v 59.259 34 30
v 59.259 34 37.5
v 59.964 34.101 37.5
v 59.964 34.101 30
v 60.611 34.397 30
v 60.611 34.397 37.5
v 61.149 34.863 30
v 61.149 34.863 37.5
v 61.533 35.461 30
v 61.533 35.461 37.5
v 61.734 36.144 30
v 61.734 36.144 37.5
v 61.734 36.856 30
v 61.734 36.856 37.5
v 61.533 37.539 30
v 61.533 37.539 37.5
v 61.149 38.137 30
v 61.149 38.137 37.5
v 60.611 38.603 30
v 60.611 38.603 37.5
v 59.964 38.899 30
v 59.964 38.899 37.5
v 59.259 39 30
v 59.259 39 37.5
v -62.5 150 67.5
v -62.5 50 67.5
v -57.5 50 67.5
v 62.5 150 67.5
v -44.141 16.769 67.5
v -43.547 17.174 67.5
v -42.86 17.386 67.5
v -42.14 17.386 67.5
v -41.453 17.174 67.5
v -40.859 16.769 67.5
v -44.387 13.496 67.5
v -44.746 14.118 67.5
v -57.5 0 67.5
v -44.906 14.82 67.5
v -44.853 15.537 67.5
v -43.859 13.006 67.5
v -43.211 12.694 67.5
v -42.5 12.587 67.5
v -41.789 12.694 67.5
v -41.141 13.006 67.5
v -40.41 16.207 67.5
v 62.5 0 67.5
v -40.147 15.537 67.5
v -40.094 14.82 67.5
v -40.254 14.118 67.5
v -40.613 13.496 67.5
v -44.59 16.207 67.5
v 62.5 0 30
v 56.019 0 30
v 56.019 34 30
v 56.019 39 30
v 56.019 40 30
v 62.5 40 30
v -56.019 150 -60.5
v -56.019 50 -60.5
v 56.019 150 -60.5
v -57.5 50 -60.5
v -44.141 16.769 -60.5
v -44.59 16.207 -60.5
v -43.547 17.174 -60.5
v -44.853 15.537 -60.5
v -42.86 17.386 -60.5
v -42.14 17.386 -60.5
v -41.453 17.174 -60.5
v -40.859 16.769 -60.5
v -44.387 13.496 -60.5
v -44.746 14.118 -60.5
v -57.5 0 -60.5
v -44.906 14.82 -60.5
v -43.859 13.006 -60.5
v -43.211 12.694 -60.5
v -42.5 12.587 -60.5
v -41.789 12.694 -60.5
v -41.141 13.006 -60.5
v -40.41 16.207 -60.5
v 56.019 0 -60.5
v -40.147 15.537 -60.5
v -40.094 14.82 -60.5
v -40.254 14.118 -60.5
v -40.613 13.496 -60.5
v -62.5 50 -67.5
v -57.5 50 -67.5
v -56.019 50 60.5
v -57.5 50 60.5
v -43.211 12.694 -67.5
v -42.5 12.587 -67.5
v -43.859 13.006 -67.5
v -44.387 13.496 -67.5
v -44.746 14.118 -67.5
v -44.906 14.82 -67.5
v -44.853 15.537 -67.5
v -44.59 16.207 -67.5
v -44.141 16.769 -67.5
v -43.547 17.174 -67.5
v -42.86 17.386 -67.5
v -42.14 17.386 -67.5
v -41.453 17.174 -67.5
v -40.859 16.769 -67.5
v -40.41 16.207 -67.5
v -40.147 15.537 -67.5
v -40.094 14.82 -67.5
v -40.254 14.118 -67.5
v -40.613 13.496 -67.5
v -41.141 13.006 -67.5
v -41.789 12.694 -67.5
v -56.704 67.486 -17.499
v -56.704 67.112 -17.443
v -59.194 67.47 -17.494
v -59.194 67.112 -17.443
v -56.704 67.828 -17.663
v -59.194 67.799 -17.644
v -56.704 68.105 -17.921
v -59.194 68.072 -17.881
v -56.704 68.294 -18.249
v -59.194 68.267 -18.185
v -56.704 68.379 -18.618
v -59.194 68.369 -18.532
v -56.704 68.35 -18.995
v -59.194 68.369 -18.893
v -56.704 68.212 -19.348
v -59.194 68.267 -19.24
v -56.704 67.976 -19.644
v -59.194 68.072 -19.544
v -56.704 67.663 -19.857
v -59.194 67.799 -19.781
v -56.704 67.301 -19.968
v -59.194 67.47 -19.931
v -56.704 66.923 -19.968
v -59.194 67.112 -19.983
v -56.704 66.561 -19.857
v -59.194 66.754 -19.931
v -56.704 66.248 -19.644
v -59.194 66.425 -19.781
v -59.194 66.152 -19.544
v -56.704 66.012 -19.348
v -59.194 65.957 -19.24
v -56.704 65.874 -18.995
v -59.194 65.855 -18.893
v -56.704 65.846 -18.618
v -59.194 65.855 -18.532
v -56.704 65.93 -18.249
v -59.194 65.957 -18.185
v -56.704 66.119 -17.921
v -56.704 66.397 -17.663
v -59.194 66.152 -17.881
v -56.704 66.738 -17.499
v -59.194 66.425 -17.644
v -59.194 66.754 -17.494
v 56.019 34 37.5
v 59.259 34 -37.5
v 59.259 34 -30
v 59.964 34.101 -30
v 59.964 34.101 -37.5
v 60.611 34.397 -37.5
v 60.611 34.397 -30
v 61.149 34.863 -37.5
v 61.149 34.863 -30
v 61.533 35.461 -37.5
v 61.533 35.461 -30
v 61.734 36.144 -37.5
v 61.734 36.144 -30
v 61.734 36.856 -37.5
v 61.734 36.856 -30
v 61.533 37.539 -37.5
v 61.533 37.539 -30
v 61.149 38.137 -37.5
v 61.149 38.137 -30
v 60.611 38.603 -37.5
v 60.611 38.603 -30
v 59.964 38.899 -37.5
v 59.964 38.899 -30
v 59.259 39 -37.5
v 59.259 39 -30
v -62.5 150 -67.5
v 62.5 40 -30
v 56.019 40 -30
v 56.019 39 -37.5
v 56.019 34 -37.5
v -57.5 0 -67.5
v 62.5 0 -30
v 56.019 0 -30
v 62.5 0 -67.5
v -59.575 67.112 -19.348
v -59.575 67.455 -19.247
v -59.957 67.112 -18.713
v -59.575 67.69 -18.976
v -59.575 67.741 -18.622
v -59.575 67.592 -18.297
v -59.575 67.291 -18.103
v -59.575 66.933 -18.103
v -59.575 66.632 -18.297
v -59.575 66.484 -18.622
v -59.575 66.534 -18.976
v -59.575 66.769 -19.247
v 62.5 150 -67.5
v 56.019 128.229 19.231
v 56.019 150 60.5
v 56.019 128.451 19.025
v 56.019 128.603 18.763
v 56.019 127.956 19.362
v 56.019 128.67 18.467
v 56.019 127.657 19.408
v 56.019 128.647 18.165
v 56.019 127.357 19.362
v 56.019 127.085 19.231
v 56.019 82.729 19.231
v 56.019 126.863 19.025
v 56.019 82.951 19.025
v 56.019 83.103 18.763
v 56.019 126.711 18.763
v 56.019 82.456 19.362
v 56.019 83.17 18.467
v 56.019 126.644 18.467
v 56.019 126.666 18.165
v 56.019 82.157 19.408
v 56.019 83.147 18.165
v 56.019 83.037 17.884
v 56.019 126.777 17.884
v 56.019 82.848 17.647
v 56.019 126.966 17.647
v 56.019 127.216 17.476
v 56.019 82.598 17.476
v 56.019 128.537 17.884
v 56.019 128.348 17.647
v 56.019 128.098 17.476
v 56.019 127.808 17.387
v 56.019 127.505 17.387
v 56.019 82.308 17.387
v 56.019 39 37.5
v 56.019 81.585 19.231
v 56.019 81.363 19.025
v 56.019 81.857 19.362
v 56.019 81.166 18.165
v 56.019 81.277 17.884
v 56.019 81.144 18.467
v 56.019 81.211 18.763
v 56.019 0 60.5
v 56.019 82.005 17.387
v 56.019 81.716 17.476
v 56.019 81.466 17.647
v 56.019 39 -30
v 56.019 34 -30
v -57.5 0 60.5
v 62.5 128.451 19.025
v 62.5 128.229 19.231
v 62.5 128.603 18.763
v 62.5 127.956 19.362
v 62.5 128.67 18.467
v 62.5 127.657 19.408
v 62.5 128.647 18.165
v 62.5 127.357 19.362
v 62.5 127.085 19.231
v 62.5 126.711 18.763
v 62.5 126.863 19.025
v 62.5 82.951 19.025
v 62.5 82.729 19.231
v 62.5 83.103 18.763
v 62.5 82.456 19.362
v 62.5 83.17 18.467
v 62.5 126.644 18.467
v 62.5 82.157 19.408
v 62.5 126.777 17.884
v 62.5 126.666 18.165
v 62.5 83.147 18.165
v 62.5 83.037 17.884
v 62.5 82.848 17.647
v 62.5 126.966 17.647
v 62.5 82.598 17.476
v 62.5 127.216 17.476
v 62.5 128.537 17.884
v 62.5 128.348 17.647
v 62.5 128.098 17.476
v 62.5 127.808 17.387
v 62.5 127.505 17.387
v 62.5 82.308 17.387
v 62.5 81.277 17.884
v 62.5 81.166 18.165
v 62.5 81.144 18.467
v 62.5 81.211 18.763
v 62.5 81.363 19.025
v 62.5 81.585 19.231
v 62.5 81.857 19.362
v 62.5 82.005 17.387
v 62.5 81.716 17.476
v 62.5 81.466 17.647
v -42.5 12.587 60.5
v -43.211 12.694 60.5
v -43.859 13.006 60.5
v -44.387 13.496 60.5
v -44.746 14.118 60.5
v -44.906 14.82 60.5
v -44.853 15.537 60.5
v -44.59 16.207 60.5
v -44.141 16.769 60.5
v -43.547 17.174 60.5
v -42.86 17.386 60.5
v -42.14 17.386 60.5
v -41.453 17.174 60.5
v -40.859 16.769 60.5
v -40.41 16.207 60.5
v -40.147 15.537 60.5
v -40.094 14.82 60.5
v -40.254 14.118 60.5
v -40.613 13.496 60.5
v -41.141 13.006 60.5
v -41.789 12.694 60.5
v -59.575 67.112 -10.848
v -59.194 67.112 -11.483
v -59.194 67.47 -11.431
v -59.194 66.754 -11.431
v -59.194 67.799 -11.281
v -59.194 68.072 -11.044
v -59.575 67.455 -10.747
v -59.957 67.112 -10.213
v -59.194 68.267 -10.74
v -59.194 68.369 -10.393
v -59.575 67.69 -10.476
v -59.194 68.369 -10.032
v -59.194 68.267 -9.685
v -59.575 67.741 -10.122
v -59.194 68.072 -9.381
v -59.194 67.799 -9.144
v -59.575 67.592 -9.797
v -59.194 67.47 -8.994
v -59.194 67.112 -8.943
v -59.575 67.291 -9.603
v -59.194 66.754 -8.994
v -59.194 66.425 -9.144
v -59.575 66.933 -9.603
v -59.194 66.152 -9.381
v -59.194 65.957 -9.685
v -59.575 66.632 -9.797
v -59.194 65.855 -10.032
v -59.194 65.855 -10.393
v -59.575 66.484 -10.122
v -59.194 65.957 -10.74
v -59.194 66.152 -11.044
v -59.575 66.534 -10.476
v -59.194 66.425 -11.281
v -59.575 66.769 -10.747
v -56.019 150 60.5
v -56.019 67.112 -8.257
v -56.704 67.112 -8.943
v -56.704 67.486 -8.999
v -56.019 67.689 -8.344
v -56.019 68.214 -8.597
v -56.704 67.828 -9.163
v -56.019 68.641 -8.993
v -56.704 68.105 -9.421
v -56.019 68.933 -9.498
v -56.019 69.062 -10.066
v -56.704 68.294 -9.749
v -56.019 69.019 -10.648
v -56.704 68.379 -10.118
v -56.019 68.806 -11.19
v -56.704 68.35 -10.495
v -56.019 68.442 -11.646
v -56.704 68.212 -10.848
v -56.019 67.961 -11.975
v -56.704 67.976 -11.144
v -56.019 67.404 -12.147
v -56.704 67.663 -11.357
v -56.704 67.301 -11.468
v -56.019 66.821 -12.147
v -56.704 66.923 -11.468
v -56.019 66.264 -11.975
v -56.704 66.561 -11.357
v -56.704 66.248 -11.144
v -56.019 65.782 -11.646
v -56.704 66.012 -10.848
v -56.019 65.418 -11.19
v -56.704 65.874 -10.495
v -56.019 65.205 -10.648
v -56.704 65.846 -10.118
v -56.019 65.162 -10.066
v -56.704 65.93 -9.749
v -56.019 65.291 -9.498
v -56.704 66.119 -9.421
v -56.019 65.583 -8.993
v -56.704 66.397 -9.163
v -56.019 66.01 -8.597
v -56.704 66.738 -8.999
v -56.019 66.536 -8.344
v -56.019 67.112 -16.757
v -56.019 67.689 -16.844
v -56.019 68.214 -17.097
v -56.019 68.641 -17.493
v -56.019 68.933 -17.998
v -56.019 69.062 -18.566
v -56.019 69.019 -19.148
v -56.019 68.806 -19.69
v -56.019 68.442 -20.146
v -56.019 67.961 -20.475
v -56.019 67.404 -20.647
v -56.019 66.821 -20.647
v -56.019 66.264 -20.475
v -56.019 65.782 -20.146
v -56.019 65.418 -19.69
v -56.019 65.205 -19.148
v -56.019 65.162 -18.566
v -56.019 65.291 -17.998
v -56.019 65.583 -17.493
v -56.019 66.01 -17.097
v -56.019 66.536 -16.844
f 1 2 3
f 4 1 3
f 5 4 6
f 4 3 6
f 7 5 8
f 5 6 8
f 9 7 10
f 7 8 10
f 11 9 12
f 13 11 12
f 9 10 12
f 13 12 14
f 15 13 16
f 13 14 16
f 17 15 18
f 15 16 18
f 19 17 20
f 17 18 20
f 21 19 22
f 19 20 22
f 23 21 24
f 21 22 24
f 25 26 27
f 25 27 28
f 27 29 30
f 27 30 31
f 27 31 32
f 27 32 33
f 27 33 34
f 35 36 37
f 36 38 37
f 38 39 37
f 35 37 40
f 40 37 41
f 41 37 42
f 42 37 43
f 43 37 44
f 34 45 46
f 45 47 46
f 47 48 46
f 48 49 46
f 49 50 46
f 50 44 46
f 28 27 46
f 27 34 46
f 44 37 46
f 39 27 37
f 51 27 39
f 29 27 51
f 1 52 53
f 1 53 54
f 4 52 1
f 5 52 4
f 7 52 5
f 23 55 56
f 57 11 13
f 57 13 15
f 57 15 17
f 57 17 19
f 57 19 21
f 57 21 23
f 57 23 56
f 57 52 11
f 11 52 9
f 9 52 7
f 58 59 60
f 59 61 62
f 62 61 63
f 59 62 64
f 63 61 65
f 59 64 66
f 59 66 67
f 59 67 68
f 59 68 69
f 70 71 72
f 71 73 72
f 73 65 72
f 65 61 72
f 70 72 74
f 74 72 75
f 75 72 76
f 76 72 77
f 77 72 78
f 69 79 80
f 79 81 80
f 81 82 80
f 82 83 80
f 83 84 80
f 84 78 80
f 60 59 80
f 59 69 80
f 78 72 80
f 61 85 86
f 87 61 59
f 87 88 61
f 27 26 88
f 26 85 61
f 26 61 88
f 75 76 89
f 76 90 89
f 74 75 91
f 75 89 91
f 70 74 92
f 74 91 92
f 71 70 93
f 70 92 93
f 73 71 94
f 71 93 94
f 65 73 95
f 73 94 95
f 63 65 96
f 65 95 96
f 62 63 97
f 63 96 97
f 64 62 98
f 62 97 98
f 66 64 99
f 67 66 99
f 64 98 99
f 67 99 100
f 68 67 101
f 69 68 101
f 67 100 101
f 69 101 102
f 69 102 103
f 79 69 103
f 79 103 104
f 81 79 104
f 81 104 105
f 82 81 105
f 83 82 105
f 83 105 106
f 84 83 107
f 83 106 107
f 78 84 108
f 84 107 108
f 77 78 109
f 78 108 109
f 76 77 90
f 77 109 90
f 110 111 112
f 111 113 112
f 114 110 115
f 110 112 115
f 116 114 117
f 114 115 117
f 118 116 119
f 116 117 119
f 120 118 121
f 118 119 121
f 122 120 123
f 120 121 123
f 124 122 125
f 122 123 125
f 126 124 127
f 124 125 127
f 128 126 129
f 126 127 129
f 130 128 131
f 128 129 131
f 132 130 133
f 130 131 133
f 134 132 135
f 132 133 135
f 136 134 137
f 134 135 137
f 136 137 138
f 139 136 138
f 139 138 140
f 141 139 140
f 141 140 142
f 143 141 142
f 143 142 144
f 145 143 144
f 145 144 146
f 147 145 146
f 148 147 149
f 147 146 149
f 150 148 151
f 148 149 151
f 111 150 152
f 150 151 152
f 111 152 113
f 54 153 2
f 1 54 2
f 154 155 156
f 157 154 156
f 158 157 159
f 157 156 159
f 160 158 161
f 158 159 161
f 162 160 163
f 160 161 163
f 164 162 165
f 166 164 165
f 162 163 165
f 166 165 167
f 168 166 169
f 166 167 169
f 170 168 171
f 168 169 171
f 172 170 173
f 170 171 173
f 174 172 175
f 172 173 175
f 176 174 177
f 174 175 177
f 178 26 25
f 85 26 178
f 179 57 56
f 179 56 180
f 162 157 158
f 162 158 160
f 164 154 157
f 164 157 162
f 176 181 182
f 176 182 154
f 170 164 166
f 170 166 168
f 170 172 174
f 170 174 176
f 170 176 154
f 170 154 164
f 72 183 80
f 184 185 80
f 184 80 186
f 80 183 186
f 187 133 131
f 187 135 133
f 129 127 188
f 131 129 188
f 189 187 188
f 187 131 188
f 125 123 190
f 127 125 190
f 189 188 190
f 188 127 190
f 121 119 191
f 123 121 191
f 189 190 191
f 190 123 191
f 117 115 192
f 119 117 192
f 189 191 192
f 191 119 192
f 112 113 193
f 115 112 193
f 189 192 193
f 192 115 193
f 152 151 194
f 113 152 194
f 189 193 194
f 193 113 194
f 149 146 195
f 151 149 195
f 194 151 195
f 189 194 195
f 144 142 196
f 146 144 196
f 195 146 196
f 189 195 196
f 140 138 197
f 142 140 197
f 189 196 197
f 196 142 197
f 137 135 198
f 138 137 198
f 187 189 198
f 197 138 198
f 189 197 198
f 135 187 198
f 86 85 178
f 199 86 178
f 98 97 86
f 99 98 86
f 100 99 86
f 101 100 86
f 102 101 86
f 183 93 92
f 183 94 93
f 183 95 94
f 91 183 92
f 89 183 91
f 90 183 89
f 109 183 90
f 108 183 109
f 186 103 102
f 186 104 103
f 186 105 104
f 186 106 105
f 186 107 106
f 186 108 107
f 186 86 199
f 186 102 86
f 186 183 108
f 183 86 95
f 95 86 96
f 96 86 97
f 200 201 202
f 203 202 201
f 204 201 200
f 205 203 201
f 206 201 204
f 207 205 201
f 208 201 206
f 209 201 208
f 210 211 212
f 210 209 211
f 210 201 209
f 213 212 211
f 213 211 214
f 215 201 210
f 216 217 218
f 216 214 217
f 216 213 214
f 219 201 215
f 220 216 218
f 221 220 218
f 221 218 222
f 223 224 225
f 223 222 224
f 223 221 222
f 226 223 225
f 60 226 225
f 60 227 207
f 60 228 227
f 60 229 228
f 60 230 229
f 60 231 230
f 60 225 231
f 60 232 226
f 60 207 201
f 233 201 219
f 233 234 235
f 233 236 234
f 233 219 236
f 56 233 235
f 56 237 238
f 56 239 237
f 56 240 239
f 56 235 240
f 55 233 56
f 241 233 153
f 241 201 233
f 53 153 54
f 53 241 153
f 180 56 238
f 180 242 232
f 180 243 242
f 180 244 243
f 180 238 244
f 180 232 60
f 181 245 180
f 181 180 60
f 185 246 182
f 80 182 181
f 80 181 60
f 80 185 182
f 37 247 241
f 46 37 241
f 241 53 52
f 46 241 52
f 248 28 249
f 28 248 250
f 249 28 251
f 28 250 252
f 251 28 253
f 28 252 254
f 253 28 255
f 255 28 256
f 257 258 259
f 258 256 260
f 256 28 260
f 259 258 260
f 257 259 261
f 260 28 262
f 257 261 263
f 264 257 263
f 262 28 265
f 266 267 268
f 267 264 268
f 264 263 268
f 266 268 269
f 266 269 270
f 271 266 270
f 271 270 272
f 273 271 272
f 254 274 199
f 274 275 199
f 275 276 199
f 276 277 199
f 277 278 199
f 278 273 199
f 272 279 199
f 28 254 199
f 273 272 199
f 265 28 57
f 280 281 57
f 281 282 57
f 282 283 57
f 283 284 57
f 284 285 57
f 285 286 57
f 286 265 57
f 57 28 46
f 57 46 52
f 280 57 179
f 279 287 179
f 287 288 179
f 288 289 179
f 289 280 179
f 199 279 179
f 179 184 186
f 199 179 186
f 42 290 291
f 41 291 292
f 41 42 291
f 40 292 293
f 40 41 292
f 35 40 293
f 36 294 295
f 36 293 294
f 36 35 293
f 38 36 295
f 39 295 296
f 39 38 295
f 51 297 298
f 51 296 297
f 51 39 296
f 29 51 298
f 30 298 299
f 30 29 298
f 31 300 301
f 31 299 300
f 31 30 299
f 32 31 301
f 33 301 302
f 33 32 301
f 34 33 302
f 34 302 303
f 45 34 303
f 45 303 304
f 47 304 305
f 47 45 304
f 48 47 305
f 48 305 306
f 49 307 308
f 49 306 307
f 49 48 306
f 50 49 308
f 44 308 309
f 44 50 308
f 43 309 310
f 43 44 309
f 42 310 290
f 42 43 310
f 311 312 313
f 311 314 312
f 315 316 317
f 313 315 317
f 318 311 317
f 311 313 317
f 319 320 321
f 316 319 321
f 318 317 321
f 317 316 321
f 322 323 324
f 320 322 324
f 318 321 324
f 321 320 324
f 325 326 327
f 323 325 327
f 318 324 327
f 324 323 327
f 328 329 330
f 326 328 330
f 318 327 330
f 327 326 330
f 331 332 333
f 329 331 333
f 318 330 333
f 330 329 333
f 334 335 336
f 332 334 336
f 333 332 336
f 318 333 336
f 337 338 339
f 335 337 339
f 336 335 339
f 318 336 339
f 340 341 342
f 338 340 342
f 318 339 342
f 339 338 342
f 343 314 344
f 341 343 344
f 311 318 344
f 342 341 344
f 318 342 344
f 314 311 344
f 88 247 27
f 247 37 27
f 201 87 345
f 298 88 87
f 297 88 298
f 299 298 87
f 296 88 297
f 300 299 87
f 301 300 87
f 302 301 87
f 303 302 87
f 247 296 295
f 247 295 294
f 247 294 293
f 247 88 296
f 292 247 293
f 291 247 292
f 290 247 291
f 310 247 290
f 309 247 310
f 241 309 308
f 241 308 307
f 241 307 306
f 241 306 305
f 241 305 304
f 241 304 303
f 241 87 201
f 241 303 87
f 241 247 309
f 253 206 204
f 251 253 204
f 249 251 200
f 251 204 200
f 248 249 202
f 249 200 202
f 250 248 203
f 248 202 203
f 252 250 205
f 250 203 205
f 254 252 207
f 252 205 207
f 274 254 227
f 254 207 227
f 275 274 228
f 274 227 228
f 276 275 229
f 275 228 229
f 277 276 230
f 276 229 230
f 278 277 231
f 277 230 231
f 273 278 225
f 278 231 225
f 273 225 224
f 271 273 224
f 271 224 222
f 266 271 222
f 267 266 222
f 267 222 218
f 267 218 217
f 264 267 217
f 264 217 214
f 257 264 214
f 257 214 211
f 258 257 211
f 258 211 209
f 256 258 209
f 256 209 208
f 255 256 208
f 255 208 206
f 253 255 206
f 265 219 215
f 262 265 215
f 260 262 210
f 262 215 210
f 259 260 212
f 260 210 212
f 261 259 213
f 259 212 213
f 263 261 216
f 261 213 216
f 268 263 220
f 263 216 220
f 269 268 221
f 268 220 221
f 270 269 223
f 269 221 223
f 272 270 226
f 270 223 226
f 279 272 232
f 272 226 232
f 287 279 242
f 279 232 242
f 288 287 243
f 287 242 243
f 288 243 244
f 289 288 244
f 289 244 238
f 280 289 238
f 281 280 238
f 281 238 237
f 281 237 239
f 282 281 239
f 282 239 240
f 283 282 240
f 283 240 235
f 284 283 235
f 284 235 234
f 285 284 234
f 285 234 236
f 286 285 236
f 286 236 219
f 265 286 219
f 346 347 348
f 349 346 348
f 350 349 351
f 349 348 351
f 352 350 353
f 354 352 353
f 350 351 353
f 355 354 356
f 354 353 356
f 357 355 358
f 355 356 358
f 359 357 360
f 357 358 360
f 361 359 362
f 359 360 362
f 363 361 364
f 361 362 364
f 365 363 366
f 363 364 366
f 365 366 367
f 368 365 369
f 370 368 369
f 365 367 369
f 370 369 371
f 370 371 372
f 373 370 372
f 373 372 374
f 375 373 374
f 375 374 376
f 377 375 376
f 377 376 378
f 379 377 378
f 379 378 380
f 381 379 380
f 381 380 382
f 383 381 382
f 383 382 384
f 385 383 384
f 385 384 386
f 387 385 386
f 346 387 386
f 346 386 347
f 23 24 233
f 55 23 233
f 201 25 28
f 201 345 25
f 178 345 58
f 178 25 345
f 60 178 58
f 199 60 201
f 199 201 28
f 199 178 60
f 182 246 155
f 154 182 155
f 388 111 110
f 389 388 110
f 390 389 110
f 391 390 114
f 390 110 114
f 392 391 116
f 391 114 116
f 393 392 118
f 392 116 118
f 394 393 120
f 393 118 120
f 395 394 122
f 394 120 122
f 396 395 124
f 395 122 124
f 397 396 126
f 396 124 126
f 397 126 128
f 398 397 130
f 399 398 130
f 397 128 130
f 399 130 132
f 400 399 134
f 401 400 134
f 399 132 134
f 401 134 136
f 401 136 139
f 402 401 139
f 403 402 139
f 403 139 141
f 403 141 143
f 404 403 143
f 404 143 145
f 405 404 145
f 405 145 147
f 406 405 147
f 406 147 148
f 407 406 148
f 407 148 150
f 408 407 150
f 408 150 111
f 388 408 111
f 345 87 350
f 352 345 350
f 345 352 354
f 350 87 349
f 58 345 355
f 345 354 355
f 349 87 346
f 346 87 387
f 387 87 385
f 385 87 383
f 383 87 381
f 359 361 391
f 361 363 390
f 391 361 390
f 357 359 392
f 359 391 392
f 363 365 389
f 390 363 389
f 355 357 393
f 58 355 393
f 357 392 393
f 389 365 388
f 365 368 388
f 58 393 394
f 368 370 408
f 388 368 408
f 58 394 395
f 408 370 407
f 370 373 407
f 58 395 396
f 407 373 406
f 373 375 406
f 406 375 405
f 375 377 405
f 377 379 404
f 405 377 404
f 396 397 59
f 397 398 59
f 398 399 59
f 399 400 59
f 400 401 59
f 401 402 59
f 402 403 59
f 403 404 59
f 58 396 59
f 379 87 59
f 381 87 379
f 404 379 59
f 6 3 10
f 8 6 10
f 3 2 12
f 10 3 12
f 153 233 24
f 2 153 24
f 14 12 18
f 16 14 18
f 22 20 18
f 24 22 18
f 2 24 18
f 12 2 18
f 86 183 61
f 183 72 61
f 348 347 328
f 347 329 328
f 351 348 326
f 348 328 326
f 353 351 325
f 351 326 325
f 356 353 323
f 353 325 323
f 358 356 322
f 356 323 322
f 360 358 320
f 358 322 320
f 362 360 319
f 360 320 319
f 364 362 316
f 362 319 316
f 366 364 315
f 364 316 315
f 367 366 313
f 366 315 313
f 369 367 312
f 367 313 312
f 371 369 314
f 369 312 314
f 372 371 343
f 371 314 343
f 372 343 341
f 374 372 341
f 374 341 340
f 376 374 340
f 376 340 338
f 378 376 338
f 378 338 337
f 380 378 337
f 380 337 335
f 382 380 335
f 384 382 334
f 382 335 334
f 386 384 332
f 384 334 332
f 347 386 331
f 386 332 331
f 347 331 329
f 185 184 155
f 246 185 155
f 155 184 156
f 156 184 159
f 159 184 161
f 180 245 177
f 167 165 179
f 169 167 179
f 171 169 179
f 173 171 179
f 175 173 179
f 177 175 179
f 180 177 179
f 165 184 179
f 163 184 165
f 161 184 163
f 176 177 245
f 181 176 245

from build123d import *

# Parameters (mm, degrees)
SKETCH1_W                       = 125
SKETCH1_H                       = 135
SKETCH1_W_2                     = 112.037037038
SKETCH1_H_2                     = 121
BOSS_EXTRUDE1_DEPTH             = 150
SKETCH3_W                       = 5
SKETCH3_H                       = 50
CUT_EXTRUDE1_DEPTH              = 68.5
CUT_EXTRUDE1_DEPTH_BACK         = 68.5
CUT_EXTRUDE2_REACH              = 127
SKETCH4_W                       = 60
SKETCH4_H                       = 40
CUT_EXTRUDE3_DEPTH              = 37.5
F_2_CLEARANCE_HOLE1_D           = 2.032
F_2_CLEARANCE_HOLE1_DEPTH       = 6.481481481
F_3_CLEARANCE_HOLE1_D           = 2.54
F_3_CLEARANCE_HOLE1_DEPTH       = 3.175
F_3_CLEARANCE_HOLE1_CSINK_D     = 3.9116
F_3_CLEARANCE_HOLE1_CSINK_ANGLE = 90
F_3_CLEARANCE_HOLE1_TIP         = 0.763092986
CUT_EXTRUDE4_REACH              = 122
SKETCH19_W                      = 121
SKETCH19_H                      = 50


with BuildPart() as part:
    # Sketch1 → Boss-Extrude1 (new body)
    with BuildSketch(Plane(origin=(0, 0, 0), x_dir=(1, 0, 0), z_dir=(0, 1, 0))):
        Rectangle(SKETCH1_W, SKETCH1_H)
        Rectangle(SKETCH1_W_2, SKETCH1_H_2, mode=Mode.SUBTRACT)
    extrude(amount=BOSS_EXTRUDE1_DEPTH)

    # Sketch3 → Cut-Extrude1 (cut, two sides)
    with BuildSketch(Plane.XY) as cut_extrude1_sk:
        with Locations((-60, 25)):
            Rectangle(SKETCH3_W, SKETCH3_H)
    extrude(amount=CUT_EXTRUDE1_DEPTH, mode=Mode.SUBTRACT)
    extrude(cut_extrude1_sk.sketch, amount=-CUT_EXTRUDE1_DEPTH_BACK, mode=Mode.SUBTRACT)

    # Sketch4 → Cut-Extrude2 (cut, up to next)
    with BuildSketch(Plane(origin=(62.5, 0, 0), x_dir=(0, 0, -1), z_dir=(1, 0, 0)), mode=Mode.PRIVATE) as cut_extrude2_sk1:
        with Locations((0, 20)):
            Rectangle(SKETCH4_W, SKETCH4_H)
    cut_extrude2_tool1 = extrude(cut_extrude2_sk1.sketch, amount=-CUT_EXTRUDE2_REACH, mode=Mode.PRIVATE) & part.part
    add(cut_extrude2_tool1.solids().sort_by_distance((62.5, 20, 0))[0], mode=Mode.SUBTRACT)

    # Sketch11 → #10 Clearance Hole1 (revolve, cut)
    with BuildSketch(Plane(origin=(-42.5, 15, 67.5), x_dir=(0, -1, 0), z_dir=(1, 0, 0))):
        Polygon((0, 0), (0, 26.849876674), (2.413, 25.4), (2.413, 0), align=None)
    f_10_clearance_hole1 = revolve(axis=Axis((-42.5, 15, 73.85), (0, 0, -1)), mode=Mode.SUBTRACT)

    # Mirror1: #10 Clearance Hole1 across plane
    add(f_10_clearance_hole1.mirror(Plane.XY), mode=Mode.SUBTRACT)

    # Sketch12 → Cut-Extrude3 (cut, symmetric)
    with BuildSketch(Plane.XY):
        with BuildLine():
            Line((56.018518519, 39), (56.018518519, 34))
            Line((56.018518519, 34), (59.259259259, 34))
            ThreePointArc((59.259259259, 34), (61.759259259, 36.5), (59.259259259, 39))
            Line((59.259259259, 39), (56.018518519, 39))
        make_face()
    extrude(amount=CUT_EXTRUDE3_DEPTH, both=True, mode=Mode.SUBTRACT)

    # #2 Clearance Hole1
    with Locations(Plane(origin=(62.5, 0, 0), x_dir=(0, 0, -1), z_dir=(1, 0, 0))):
        with Locations((-18.3915, 127.656921), (-18.3915, 82.156921)):
            Hole(F_2_CLEARANCE_HOLE1_D / 2, depth=F_2_CLEARANCE_HOLE1_DEPTH)

    # #3 Clearance Hole1
    with Locations(Plane(origin=(-56.018518519, 0, 0), x_dir=(0, 0, -1), z_dir=(1, 0, 0))):
        with Locations((10.2126, 67.112098568), (18.7126, 67.112098568)):
            CounterSinkHole(F_3_CLEARANCE_HOLE1_D / 2, F_3_CLEARANCE_HOLE1_CSINK_D / 2, depth=F_3_CLEARANCE_HOLE1_DEPTH, counter_sink_angle=F_3_CLEARANCE_HOLE1_CSINK_ANGLE)
            with Locations((0, 0, -(F_3_CLEARANCE_HOLE1_DEPTH + F_3_CLEARANCE_HOLE1_TIP / 2))):  # 118° drill point
                Cone(0, F_3_CLEARANCE_HOLE1_D / 2, F_3_CLEARANCE_HOLE1_TIP, mode=Mode.SUBTRACT)

    # Sketch19 → Cut-Extrude4 (cut, up to next)
    with BuildSketch(Plane.ZY.offset(57.5), mode=Mode.PRIVATE) as cut_extrude4_sk1:
        with Locations((0, 25)):
            Rectangle(SKETCH19_W, SKETCH19_H)
    cut_extrude4_tool1 = extrude(cut_extrude4_sk1.sketch, amount=-CUT_EXTRUDE4_REACH, mode=Mode.PRIVATE) & part.part
    add(cut_extrude4_tool1.solids().sort_by_distance((-57.5, 25, 0))[0], mode=Mode.SUBTRACT)


solid = part.part
